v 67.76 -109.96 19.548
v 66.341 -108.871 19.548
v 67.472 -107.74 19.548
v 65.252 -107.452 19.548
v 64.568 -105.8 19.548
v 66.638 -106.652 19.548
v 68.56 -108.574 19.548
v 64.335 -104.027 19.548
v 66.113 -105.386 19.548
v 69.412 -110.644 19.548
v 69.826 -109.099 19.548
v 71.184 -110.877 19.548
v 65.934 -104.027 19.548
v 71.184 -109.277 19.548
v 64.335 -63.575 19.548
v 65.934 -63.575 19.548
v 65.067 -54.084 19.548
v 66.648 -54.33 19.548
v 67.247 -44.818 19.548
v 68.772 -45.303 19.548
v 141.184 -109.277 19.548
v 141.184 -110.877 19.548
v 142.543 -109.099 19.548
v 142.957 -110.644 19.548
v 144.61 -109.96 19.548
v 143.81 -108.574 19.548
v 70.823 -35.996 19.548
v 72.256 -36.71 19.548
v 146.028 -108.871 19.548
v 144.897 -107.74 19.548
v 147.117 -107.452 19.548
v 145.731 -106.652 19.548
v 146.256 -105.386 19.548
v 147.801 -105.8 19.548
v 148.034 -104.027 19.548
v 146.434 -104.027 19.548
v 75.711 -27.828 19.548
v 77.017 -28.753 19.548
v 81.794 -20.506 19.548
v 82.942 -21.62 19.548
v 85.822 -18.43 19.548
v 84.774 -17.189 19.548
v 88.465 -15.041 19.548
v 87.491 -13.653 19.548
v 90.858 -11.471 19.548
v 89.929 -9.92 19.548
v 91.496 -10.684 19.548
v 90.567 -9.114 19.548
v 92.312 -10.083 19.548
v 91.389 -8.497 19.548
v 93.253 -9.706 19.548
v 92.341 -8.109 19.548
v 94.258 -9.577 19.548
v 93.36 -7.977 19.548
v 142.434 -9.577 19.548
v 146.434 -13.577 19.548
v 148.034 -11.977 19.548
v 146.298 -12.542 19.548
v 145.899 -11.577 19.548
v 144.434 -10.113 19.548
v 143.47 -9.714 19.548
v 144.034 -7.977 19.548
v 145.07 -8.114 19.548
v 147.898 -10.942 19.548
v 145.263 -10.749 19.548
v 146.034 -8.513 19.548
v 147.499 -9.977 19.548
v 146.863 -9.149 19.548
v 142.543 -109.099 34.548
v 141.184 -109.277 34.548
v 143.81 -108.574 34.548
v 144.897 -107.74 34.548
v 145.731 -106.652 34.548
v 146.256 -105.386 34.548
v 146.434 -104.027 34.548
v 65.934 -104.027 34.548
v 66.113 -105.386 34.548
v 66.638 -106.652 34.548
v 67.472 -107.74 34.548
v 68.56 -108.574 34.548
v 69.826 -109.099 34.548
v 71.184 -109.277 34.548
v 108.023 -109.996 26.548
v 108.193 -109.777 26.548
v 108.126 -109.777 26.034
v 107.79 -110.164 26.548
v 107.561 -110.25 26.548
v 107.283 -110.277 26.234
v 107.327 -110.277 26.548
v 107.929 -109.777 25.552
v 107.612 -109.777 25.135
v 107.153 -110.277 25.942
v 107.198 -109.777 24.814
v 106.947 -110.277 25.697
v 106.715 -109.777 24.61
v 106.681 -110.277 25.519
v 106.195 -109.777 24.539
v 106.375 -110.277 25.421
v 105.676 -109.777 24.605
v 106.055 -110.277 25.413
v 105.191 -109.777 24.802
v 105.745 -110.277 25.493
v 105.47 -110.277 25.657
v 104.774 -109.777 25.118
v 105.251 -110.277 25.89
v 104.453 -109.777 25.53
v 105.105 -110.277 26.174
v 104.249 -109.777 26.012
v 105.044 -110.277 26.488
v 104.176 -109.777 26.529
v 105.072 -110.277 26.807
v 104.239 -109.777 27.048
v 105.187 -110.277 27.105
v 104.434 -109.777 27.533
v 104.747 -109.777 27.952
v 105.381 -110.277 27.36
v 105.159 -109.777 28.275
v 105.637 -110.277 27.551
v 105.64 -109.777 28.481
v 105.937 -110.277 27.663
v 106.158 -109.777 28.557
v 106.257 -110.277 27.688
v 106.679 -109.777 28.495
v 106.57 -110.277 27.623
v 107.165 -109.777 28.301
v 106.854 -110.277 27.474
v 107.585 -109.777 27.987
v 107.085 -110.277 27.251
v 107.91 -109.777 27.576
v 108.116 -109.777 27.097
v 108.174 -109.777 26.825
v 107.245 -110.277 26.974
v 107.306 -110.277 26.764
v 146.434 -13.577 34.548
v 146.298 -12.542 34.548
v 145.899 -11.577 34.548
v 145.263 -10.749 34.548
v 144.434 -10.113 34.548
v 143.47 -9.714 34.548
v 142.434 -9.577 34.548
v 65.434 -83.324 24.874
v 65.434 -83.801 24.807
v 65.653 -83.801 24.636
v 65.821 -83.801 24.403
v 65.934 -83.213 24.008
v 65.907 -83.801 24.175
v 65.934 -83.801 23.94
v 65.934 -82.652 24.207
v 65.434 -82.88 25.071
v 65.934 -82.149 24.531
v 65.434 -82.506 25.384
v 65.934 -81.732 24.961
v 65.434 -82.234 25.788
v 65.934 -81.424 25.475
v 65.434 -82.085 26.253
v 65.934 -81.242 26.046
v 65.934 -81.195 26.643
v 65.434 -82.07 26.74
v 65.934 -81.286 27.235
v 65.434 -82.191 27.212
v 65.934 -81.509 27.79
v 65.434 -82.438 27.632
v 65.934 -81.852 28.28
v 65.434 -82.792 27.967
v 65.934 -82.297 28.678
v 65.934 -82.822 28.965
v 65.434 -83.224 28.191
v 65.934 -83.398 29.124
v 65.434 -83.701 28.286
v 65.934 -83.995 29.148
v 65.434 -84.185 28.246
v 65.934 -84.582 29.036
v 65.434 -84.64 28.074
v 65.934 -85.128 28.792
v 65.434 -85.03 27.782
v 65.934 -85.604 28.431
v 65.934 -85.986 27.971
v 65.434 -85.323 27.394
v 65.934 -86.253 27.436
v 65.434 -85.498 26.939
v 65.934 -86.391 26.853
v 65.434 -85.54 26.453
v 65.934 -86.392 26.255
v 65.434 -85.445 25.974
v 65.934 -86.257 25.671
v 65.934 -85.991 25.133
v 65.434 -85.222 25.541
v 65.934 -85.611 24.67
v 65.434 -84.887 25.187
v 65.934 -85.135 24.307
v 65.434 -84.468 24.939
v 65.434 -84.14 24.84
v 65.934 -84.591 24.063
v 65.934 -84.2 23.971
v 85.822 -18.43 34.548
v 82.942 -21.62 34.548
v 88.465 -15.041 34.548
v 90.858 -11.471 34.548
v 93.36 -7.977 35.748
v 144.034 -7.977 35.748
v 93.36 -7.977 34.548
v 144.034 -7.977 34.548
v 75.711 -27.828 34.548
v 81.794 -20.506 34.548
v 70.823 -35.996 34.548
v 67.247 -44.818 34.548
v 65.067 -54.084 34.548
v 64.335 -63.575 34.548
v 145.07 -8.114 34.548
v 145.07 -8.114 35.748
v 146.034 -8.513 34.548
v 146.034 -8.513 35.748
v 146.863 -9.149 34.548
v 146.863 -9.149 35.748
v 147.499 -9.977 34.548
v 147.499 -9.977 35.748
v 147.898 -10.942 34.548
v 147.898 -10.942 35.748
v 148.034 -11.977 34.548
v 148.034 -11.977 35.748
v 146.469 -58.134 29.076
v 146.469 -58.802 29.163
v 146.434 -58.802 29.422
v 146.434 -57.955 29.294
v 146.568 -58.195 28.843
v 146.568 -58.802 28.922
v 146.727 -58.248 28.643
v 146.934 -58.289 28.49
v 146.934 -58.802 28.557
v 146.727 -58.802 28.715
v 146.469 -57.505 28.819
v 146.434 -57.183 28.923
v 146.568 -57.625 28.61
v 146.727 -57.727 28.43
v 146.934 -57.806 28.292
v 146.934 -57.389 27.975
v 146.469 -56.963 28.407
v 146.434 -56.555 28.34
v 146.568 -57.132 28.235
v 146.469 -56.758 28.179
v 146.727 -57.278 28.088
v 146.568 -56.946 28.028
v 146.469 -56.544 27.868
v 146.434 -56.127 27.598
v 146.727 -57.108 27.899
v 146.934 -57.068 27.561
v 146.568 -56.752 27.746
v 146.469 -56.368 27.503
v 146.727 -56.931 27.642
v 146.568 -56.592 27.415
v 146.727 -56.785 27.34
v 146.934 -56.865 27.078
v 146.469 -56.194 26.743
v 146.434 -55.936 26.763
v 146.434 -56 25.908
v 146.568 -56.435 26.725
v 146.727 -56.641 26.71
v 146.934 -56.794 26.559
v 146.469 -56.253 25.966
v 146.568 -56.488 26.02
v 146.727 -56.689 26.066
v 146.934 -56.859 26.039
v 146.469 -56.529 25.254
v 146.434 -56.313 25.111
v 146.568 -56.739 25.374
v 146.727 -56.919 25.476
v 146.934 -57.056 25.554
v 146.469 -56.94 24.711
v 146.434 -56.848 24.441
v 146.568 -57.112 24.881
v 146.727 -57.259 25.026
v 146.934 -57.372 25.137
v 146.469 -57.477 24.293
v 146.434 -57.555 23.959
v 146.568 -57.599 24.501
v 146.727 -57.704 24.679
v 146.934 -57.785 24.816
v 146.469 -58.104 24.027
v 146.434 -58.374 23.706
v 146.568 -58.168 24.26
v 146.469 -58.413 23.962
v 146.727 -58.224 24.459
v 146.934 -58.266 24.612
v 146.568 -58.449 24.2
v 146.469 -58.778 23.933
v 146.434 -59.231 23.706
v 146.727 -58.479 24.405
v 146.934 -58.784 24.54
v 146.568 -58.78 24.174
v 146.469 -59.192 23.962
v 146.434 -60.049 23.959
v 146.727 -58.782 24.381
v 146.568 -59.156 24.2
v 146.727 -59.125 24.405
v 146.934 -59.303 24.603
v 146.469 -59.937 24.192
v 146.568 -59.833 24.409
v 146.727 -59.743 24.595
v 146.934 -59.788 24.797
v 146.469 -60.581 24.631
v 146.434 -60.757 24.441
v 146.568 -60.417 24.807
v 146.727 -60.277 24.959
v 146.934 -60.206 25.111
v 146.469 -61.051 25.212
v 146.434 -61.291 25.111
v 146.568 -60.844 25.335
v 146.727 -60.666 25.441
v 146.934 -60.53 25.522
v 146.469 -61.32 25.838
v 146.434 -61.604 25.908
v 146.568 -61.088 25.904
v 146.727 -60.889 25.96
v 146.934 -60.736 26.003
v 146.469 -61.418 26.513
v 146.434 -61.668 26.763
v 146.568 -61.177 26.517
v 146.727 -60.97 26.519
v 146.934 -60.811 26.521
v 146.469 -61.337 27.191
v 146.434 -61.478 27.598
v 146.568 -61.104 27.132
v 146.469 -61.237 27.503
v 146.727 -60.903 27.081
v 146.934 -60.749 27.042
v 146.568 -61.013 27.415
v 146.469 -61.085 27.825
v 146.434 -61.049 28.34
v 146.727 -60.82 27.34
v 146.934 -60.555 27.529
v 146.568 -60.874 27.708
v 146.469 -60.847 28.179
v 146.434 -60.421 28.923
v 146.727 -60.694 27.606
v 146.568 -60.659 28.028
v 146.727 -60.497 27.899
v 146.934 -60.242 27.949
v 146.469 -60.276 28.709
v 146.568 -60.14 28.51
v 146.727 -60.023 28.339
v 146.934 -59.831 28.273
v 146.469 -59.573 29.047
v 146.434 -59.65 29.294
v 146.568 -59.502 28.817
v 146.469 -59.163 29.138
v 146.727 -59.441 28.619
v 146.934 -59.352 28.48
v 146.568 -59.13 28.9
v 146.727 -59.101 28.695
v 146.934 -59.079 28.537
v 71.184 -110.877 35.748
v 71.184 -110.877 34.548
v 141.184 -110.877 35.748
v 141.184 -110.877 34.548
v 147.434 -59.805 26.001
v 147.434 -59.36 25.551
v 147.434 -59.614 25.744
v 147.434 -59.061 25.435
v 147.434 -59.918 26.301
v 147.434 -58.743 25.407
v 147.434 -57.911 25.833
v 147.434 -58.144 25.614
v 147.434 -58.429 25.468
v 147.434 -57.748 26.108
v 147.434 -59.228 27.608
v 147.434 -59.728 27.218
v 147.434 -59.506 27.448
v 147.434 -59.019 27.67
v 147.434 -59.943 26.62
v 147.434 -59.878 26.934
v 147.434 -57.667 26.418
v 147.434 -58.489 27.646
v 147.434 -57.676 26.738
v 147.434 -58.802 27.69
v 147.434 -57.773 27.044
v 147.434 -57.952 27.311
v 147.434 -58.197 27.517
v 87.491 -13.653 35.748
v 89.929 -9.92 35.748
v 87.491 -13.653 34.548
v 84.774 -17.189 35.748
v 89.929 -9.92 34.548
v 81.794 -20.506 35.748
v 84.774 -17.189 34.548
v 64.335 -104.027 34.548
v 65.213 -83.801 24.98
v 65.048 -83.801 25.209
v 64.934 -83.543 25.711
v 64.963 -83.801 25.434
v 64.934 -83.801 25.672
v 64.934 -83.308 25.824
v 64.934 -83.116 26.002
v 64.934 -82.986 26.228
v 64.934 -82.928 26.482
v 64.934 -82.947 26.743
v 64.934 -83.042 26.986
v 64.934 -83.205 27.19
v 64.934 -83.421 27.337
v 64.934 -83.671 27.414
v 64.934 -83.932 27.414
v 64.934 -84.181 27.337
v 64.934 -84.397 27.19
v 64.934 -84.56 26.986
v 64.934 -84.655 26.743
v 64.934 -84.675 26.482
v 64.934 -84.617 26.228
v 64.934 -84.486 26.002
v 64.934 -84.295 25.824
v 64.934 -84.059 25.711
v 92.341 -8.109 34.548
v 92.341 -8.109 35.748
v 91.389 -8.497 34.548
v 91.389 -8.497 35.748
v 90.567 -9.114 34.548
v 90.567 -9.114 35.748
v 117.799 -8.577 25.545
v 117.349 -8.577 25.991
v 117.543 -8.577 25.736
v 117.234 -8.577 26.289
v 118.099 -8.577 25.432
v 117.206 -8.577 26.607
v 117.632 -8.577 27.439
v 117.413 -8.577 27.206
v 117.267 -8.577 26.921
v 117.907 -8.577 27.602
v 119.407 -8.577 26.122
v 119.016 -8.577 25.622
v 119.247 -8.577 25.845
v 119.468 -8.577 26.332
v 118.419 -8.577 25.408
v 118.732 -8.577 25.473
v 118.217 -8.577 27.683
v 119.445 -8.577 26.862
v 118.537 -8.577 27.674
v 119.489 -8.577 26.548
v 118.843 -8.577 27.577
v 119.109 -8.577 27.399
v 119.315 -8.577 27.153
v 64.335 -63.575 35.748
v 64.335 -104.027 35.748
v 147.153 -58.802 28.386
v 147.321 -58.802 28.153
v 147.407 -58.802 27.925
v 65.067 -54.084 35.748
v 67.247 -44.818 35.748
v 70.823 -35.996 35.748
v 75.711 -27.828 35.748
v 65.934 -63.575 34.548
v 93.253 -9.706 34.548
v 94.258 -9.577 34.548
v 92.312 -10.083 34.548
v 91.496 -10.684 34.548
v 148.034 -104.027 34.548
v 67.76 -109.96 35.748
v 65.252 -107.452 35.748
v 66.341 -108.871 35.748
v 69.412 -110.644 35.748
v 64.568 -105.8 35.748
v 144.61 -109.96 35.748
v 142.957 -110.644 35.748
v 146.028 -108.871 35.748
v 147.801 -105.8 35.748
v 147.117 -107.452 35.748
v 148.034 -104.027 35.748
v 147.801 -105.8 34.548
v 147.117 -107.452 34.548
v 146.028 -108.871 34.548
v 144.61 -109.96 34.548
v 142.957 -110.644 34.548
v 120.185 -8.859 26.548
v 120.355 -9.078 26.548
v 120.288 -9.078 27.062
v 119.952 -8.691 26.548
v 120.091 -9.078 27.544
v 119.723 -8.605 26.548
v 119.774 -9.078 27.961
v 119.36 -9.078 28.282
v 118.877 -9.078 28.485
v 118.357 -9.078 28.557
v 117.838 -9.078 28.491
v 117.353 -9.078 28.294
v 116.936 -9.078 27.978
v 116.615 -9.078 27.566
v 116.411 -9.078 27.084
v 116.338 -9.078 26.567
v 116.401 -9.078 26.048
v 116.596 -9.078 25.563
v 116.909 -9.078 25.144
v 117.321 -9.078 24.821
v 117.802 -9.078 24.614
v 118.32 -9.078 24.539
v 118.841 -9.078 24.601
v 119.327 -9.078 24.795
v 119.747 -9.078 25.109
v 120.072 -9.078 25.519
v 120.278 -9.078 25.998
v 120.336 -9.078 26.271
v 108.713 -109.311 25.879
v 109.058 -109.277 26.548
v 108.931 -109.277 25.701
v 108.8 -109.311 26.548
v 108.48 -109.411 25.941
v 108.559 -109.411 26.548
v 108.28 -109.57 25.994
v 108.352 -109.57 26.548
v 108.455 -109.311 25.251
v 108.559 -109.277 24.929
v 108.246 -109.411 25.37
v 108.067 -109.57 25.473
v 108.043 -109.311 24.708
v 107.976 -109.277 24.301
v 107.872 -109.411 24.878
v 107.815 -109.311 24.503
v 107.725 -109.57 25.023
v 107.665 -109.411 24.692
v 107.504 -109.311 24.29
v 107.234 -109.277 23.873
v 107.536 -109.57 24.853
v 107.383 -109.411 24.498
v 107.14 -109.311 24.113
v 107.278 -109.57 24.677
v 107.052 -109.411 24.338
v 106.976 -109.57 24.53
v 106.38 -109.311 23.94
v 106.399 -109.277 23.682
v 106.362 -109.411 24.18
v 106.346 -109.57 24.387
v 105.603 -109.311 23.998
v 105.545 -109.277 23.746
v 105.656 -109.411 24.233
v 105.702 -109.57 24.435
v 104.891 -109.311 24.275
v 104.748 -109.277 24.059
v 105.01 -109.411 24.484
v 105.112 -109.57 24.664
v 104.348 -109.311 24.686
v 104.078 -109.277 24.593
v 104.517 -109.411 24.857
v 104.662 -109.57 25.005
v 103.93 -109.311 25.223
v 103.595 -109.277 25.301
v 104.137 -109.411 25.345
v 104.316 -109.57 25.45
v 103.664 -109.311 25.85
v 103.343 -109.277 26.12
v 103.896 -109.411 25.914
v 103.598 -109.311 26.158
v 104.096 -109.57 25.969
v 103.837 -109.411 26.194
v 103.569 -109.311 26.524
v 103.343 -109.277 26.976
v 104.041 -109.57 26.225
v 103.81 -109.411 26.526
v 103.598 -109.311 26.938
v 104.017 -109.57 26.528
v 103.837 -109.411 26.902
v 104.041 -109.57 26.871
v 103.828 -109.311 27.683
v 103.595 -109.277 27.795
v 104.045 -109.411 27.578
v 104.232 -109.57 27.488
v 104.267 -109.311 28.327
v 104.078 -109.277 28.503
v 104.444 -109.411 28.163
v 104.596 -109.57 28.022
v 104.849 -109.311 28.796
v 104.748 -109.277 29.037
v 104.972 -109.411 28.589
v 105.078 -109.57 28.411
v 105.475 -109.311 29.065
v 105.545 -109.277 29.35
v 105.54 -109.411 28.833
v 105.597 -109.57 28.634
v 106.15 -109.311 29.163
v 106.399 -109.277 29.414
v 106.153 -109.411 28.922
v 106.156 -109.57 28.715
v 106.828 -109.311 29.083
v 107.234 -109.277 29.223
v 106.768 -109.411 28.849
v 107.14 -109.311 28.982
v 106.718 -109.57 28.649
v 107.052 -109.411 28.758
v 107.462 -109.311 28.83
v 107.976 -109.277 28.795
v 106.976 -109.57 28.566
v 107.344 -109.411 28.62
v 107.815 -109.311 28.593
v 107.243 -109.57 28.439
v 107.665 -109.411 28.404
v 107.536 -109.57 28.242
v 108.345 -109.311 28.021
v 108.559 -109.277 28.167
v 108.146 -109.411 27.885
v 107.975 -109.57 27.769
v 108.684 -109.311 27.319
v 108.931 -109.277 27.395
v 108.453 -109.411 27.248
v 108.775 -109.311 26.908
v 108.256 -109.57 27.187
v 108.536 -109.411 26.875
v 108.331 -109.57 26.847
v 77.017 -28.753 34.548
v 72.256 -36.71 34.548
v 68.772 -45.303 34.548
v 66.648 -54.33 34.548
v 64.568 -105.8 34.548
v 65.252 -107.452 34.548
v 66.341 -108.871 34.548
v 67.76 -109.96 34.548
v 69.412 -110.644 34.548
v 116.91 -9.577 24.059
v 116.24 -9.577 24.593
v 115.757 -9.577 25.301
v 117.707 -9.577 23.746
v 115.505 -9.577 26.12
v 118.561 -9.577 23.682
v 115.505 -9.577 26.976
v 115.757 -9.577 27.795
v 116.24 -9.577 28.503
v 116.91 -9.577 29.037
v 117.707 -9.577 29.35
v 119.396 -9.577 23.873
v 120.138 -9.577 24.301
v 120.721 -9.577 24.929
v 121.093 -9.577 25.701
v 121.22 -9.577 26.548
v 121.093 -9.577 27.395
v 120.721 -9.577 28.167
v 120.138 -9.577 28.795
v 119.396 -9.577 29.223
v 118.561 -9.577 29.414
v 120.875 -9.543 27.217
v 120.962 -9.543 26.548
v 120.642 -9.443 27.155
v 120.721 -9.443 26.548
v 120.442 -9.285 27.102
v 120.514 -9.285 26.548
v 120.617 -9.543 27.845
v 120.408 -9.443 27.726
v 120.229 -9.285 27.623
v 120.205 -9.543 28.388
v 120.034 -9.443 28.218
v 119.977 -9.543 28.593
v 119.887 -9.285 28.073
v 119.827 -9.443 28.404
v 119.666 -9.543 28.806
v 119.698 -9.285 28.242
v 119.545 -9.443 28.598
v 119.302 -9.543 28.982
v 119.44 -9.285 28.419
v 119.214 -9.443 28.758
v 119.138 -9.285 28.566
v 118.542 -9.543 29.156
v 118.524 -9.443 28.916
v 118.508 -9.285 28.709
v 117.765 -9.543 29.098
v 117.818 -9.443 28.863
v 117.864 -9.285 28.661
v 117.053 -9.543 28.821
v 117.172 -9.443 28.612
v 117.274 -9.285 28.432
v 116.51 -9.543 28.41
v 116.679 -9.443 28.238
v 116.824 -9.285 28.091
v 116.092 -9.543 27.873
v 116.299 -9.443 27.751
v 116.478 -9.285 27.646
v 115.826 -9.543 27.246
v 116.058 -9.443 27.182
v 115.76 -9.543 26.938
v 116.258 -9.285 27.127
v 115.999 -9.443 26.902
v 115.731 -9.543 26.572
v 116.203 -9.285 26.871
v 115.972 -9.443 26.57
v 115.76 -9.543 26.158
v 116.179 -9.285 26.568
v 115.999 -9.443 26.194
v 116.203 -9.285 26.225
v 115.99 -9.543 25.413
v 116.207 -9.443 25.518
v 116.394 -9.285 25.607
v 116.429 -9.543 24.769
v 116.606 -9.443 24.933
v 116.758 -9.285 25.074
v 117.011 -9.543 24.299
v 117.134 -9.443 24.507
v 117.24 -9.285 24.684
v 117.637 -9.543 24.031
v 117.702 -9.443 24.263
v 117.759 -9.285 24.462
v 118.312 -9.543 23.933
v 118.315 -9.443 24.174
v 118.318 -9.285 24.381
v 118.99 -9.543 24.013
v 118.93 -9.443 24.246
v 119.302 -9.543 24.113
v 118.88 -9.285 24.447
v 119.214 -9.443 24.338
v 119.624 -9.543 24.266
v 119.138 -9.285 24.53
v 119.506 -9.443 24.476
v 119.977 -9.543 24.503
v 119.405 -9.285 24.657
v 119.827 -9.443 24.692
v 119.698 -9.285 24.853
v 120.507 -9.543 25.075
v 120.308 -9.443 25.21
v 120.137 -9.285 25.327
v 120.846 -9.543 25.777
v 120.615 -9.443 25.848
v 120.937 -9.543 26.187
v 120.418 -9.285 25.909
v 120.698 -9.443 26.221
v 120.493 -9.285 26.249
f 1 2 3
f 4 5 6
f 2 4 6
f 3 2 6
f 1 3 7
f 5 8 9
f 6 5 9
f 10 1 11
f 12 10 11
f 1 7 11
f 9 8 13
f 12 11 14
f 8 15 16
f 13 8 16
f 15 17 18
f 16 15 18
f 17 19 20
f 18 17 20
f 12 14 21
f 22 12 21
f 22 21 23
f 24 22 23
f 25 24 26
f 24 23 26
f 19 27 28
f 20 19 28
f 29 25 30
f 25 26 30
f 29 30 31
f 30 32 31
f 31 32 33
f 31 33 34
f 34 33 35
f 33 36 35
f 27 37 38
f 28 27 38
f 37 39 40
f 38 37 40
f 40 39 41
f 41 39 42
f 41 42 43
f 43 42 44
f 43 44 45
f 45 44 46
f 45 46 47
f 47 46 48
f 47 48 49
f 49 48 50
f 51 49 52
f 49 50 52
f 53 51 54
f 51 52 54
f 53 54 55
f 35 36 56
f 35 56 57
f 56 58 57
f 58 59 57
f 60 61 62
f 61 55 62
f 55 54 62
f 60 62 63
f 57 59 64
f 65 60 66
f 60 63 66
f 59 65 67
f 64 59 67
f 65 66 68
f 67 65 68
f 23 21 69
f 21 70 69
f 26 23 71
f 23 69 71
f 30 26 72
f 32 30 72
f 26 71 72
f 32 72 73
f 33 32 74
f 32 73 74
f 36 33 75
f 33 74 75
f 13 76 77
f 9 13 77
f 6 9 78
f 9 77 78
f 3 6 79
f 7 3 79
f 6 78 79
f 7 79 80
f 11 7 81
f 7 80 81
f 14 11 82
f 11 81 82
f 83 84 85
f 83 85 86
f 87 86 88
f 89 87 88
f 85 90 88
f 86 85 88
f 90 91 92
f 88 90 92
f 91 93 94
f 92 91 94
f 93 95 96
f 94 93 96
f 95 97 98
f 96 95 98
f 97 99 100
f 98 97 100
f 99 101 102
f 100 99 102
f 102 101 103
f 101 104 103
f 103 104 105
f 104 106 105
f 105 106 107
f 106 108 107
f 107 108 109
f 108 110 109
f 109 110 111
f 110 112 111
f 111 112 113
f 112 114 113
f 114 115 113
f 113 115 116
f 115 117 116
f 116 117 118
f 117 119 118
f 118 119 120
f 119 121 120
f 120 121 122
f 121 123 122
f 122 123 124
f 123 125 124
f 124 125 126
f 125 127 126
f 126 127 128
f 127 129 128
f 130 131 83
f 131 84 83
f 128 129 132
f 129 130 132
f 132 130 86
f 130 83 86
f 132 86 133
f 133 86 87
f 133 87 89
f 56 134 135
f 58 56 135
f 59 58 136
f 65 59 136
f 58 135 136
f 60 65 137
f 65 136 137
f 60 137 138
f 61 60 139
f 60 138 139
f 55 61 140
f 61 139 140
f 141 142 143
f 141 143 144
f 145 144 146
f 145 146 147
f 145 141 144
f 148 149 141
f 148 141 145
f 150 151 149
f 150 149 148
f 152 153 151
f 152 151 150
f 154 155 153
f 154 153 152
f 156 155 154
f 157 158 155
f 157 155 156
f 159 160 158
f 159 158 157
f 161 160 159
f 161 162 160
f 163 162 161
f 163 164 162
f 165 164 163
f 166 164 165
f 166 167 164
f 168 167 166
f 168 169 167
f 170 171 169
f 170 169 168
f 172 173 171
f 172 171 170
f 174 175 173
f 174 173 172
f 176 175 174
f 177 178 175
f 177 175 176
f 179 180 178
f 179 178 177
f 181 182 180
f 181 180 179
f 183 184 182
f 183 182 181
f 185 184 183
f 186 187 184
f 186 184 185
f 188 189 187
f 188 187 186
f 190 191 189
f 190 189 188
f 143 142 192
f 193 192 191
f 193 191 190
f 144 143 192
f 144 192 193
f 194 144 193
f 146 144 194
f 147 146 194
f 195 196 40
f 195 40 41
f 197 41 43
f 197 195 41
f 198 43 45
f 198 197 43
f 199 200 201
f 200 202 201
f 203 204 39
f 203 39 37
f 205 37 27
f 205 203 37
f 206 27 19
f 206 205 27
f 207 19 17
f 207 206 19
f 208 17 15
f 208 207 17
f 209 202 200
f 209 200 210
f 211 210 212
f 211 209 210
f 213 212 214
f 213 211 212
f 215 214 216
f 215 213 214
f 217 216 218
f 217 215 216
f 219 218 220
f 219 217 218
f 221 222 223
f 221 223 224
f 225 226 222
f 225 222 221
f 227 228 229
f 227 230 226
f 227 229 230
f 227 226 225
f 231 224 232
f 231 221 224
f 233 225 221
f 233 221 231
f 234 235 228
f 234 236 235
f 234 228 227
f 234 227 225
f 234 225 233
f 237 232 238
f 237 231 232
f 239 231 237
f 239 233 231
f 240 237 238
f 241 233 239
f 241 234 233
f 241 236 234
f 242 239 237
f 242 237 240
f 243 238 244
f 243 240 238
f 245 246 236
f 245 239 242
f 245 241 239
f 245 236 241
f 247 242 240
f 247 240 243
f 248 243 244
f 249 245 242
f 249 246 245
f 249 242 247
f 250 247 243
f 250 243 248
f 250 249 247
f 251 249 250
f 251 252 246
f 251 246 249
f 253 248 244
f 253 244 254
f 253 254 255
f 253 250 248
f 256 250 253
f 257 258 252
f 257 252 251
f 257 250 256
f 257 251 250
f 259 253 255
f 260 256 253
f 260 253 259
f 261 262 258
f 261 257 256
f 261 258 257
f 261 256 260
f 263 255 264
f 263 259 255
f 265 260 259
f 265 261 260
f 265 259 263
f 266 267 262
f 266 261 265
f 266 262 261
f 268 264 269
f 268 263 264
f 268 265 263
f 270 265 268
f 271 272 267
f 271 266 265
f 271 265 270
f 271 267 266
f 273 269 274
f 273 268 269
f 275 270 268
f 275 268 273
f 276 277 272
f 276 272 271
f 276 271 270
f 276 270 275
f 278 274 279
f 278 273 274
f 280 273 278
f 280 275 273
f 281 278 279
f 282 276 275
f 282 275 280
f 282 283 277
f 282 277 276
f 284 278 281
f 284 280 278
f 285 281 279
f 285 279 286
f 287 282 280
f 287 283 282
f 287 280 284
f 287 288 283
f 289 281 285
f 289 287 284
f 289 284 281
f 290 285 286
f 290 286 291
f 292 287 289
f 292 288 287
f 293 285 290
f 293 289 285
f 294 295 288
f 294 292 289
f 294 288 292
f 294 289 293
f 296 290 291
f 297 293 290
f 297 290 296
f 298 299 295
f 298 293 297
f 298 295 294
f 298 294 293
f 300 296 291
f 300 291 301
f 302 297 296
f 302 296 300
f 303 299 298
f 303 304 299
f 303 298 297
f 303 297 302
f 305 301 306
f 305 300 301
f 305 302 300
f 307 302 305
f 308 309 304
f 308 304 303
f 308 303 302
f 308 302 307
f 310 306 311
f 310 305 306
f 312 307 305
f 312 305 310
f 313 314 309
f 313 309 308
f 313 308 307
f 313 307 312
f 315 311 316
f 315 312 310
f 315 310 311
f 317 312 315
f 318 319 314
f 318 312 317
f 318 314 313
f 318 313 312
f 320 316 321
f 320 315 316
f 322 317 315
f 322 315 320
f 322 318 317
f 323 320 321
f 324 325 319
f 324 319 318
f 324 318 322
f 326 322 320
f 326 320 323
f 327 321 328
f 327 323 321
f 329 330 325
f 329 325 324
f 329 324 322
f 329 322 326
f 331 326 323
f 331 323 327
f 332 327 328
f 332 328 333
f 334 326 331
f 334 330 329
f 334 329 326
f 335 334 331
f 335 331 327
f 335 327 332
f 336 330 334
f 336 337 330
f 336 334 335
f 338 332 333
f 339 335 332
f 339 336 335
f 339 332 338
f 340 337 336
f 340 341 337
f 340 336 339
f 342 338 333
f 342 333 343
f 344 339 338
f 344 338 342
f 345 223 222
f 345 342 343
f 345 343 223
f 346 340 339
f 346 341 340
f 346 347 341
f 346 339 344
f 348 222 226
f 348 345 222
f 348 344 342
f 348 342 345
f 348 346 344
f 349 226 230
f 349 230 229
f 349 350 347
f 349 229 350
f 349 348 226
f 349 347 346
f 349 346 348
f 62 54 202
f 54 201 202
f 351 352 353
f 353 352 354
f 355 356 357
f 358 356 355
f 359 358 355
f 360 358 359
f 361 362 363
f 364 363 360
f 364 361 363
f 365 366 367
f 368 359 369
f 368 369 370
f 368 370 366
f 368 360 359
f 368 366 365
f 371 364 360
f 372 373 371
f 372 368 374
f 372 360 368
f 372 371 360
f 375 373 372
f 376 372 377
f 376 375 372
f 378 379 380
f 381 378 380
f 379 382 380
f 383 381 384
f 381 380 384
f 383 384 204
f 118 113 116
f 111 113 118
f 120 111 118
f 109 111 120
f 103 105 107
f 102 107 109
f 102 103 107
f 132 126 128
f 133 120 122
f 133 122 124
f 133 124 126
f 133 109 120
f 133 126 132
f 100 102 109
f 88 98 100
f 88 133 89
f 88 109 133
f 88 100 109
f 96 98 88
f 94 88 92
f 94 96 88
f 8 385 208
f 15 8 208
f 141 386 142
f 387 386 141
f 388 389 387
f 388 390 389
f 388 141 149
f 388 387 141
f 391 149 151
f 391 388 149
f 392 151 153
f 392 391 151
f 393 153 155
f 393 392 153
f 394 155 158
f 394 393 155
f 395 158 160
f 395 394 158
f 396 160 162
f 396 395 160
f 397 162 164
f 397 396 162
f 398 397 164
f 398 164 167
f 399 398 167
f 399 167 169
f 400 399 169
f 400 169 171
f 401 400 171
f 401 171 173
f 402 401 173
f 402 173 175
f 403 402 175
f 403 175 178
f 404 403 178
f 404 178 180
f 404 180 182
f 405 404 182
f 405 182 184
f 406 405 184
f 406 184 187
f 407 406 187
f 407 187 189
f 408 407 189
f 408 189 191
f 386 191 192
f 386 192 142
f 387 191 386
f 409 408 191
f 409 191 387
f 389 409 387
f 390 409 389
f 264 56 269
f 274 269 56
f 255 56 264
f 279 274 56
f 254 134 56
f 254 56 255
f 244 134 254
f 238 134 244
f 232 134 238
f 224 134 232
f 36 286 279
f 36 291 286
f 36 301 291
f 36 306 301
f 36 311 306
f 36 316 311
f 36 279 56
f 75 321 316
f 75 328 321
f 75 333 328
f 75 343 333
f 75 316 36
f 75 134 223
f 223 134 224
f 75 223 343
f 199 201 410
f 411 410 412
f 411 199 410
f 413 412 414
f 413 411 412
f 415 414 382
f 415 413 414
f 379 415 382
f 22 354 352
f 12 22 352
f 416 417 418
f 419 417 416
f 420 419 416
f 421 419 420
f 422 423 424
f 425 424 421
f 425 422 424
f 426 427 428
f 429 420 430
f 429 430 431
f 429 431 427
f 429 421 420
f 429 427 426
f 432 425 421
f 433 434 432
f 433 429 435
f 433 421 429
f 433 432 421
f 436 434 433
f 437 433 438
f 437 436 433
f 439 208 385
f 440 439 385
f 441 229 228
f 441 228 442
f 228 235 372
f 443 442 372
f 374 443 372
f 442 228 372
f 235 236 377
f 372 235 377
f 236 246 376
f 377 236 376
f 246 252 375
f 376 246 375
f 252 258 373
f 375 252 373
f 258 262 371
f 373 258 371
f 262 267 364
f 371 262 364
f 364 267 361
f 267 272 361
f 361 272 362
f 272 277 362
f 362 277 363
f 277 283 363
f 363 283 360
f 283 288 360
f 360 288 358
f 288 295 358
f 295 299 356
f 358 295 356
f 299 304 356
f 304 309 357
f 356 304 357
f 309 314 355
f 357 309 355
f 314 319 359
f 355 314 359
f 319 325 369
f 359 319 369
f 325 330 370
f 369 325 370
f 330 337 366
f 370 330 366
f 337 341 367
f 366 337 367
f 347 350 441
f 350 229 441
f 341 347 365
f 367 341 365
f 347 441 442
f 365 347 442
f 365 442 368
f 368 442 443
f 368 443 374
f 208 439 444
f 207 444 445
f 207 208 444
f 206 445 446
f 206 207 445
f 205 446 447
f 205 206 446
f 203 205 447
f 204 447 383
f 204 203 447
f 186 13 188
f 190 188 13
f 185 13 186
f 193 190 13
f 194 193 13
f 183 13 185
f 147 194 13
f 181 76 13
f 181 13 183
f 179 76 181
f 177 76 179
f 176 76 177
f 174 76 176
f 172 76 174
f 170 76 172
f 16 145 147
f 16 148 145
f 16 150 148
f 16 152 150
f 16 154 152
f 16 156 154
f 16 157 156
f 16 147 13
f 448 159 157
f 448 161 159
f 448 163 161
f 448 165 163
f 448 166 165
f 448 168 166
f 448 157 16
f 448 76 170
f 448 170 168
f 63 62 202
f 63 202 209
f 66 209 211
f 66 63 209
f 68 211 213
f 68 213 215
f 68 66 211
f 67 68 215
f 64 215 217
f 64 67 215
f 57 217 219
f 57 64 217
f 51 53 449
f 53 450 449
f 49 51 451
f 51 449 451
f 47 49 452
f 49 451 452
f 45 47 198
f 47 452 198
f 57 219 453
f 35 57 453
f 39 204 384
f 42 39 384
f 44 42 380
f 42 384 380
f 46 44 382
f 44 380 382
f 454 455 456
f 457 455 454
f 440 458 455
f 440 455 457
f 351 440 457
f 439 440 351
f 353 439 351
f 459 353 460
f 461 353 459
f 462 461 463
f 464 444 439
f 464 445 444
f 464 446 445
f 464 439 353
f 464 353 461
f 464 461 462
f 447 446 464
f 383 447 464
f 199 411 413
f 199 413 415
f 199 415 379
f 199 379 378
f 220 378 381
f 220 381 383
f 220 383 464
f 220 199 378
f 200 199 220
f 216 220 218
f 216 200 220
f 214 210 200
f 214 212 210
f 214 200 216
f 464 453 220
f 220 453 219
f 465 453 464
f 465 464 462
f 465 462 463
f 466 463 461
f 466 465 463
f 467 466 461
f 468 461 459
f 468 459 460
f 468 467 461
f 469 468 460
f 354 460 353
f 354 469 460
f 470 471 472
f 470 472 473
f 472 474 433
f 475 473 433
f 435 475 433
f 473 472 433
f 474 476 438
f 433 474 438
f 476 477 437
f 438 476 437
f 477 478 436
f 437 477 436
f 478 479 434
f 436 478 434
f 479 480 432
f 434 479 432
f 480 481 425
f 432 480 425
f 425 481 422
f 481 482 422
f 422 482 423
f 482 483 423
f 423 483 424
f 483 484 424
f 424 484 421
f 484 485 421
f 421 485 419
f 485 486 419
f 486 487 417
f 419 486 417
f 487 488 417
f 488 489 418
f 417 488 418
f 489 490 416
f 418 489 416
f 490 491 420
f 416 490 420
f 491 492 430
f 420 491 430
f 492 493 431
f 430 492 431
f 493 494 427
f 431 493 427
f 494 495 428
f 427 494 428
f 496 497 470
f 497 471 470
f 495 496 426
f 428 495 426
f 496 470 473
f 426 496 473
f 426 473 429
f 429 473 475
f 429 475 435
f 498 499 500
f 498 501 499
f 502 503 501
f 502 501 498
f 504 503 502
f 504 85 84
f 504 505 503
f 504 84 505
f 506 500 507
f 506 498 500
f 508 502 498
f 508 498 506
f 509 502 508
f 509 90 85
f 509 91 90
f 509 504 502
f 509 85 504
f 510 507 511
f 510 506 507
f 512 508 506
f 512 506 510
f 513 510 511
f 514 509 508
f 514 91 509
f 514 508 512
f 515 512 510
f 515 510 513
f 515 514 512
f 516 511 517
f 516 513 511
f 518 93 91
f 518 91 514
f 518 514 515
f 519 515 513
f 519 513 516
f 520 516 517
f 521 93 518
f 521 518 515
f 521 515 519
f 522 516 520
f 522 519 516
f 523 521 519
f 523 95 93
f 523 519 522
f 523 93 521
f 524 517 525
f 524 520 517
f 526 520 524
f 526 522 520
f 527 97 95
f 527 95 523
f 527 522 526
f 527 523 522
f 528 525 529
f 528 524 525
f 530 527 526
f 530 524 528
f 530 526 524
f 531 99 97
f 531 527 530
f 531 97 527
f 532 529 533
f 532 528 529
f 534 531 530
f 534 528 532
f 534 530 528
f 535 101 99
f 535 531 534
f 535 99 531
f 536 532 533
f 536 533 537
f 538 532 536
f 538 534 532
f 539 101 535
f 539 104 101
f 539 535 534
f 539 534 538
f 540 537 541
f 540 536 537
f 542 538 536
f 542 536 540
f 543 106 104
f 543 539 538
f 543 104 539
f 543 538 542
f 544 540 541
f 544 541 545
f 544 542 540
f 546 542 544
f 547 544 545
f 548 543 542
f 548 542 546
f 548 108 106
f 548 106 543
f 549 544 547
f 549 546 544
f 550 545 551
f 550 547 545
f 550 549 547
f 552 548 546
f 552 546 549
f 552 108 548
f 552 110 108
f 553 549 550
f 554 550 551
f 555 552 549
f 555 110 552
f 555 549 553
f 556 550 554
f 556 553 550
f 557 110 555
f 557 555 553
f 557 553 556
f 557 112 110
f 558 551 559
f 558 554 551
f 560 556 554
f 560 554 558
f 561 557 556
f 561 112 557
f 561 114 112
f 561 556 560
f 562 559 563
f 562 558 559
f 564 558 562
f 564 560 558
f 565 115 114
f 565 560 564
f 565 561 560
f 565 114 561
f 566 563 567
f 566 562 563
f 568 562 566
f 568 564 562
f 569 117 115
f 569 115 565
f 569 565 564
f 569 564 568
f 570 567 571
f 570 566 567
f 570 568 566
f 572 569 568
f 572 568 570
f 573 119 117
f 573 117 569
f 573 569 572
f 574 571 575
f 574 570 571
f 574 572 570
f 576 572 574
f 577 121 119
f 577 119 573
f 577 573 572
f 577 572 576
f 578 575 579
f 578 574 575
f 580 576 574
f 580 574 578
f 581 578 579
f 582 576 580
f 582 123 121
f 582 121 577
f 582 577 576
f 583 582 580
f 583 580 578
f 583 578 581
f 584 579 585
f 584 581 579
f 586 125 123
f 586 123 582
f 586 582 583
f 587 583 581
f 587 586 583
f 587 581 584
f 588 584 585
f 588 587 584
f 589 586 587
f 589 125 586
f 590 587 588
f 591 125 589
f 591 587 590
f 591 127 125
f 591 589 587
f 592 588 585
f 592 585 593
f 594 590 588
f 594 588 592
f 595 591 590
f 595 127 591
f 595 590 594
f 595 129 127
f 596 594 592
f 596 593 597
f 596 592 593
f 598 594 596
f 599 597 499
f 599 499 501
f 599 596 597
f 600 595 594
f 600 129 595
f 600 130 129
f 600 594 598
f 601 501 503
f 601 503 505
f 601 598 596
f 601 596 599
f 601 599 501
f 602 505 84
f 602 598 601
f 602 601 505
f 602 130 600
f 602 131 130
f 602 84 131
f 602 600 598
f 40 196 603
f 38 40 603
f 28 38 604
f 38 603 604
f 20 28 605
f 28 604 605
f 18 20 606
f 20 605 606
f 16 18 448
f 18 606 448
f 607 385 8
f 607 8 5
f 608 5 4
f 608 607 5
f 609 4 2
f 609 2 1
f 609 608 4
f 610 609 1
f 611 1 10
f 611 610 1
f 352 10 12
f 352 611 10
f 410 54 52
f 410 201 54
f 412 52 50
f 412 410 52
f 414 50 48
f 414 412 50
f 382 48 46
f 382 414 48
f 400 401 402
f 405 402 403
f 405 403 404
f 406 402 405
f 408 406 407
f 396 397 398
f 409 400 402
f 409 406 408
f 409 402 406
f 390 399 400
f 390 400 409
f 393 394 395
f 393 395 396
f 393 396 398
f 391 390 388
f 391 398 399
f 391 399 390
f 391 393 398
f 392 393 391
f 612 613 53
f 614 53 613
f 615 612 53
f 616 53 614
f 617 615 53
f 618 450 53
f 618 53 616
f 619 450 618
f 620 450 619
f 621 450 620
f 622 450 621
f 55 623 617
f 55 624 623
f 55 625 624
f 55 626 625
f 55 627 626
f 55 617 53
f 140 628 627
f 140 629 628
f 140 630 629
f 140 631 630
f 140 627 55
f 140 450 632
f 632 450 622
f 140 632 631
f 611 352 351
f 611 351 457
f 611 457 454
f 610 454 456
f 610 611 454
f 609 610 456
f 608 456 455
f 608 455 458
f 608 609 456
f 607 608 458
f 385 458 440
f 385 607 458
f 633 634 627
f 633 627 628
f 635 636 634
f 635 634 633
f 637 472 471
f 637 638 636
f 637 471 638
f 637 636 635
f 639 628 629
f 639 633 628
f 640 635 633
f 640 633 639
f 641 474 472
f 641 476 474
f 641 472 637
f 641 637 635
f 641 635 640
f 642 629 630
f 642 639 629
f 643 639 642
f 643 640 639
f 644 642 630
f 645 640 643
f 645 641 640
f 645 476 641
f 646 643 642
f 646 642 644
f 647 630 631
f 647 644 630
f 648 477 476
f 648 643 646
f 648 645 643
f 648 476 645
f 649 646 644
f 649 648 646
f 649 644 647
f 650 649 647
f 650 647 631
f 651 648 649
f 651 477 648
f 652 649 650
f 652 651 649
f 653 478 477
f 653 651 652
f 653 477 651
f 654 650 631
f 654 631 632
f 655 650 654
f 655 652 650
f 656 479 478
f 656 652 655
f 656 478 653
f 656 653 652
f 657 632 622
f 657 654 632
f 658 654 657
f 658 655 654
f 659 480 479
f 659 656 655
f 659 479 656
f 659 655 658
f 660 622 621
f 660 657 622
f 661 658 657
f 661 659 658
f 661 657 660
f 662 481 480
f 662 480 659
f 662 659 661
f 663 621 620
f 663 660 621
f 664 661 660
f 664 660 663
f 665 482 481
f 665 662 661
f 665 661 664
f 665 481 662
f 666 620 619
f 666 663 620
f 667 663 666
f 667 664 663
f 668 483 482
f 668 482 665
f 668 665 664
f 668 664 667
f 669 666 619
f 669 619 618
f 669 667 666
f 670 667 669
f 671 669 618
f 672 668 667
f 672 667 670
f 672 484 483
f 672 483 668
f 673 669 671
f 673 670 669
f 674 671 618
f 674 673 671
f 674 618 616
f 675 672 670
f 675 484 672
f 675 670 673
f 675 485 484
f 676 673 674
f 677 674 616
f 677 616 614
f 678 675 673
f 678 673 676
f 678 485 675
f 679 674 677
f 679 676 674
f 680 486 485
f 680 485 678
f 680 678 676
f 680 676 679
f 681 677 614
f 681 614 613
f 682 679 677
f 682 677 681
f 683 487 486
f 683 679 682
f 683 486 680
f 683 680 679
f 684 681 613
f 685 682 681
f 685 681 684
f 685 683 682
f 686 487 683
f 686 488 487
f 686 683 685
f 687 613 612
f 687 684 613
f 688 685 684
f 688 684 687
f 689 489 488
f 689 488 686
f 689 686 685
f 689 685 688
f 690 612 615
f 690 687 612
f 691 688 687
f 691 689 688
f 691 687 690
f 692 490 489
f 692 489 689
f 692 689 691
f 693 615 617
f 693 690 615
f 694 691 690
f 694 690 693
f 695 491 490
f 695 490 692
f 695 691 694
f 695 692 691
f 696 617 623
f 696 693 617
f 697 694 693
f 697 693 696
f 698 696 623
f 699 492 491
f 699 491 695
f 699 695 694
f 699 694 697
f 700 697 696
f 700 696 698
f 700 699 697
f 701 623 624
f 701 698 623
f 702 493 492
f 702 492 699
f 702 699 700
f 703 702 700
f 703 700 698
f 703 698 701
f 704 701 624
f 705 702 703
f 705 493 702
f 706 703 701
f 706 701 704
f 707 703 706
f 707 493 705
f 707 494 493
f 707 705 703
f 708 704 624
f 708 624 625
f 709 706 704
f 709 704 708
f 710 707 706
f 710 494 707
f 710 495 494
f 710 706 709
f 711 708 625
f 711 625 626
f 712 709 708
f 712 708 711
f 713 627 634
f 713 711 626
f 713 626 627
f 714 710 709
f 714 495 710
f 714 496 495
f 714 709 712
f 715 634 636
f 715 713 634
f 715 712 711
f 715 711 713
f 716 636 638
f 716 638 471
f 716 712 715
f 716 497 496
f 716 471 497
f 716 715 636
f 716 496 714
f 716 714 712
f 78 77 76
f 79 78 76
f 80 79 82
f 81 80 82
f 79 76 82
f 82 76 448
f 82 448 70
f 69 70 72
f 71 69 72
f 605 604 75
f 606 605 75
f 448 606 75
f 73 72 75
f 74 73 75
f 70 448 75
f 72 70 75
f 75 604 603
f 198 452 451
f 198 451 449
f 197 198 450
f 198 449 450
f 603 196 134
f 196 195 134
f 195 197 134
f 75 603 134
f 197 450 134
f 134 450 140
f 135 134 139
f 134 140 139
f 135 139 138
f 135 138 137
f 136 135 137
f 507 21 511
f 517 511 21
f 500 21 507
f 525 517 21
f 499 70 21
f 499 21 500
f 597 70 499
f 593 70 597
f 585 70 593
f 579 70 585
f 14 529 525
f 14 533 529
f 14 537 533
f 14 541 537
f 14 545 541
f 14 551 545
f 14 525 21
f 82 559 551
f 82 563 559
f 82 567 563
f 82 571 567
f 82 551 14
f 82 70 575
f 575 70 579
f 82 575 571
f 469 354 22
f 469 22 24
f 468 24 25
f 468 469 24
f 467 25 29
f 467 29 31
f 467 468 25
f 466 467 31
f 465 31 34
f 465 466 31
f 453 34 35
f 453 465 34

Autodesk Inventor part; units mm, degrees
ref_plane "YZ Plane" through (0, 0, 0) normal (1, 0, 0) x (0, 1, 0)
ref_plane "XZ Plane" through (0, 0, 0) normal (0, 1, 0) x (-1, 0, 0)
ref_plane "XY Plane" through (0, 0, 0) normal (0, 0, 1) x (1, 0, 0)
ref_plane "Work Plane1" through (106.1845, -59.4274, 33.5479) normal (0, 0, 1) x (1, 0, 0)
sketch "Sketch2" plane through (106.1845, -59.4274, 33.5479) normal (0, 0, 1) x (1, 0, 0)
  arc A0 (-23.0626, 37.6331) -> (-14.0565, 49.6) centre (-66.1252, 79.4136) ccw
  line L0 (40, 49.6) -> (-14.0565, 49.6)
  arc A1 (-23.0626, 37.6331) -> (-40, -4.1474) centre (20, -4.1474) ccw construction
  line L1 (-40, -4.1474) -> (-40, -44.6)
  line L2 (-35, -49.6) -> (35, -49.6)
  arc A2 (-40, -44.6) -> (-35, -49.6) centre (-35, -44.6) ccw
  arc A3 (35, -49.6) -> (40, -44.6) centre (35, -44.6) ccw
  line L3 (40, -44.6) -> (40, 49.6)
  arc A4 (-23.242, 37.8072) -> (-40.25, -4.1474) centre (20, -4.1474) ccw
  arc A5 (-23.242, 37.8072) -> (-14.2017, 49.85) centre (-66.1252, 79.4136) ccw
  line L4 (-14.2017, 49.85) -> (40.25, 49.85)
  line L5 (40.25, 49.85) -> (40.25, -44.6)
  arc A6 (35, -49.85) -> (40.25, -44.6) centre (35, -44.6) ccw
  line L6 (35, -49.85) -> (-35, -49.85)
  arc A7 (-40.25, -44.6) -> (-35, -49.85) centre (-35, -44.6) ccw
  line L7 (-40.25, -44.6) -> (-40.25, -4.1474)
  arc A8 (-24.3904, 38.9214) -> (-41.85, -4.1474) centre (20, -4.1474) ccw
  arc A9 (-24.3904, 38.9214) -> (-15.1403, 51.45) centre (-66.1252, 79.4136) ccw
  line L8 (-15.1403, 51.45) -> (41.85, 51.45)
  line L9 (41.85, 51.45) -> (41.85, -44.6)
  arc A10 (35, -51.45) -> (41.85, -44.6) centre (35, -44.6) ccw
  line L10 (35, -51.45) -> (-35, -51.45)
  arc A11 (-41.85, -44.6) -> (-35, -51.45) centre (-35, -44.6) ccw
  line L11 (-41.85, -44.6) -> (-41.85, -4.1474)
  point P0 (-106.1845, 59.4274)
  dimension "d0" = 0.25
  dimension "d1" = 1.6
extrude "Extrusion1" add sketch "Sketch2" against normal blind 15
thicken "Thicken1" operation add thickness 1 both sides no extend neighbours yes toward (0, 0, 1) faces at (147.5012, -40.5274, 33.5479)
sketch "Sketch3" plane through (71.1845, -110.8774, 34.5479) normal (0, 0, 1) x (1, 0, 0)
  line L0 (0, 0) -> (70, 0) projected
  arc A0 (70, 0) -> (76.85, 6.85) centre (70, 6.85) ccw projected
  line L1 (76.85, 6.85) -> (76.85, 102.9) projected
  line L2 (76.85, 102.9) -> (19.8597, 102.9) projected
  arc A1 (10.6096, 90.3714) -> (19.8597, 102.9) centre (-31.1252, 130.8636) ccw projected
  arc A2 (10.6096, 90.3714) -> (-6.85, 47.3026) centre (55, 47.3026) ccw projected
  line L3 (-6.85, 47.3026) -> (-6.85, 6.85) projected
  arc A3 (-6.85, 6.85) -> (0, 0) centre (0, 6.85) ccw projected
  arc A4 (70, 1.6) -> (75.25, 6.85) centre (70, 6.85) ccw projected
  line L4 (70, 1.6) -> (0, 1.6) projected
  arc A5 (-5.25, 6.85) -> (0, 1.6) centre (0, 6.85) ccw projected
  line L5 (-5.25, 6.85) -> (-5.25, 47.3026) projected
  arc A6 (11.758, 89.2572) -> (-5.25, 47.3026) centre (55, 47.3026) ccw projected
  arc A7 (11.758, 89.2572) -> (20.7983, 101.3) centre (-31.1252, 130.8636) ccw projected
  line L6 (20.7983, 101.3) -> (75.25, 101.3) projected
  line L7 (75.25, 101.3) -> (75.25, 6.85) projected
  point P0 (-71.1845, 110.8774)
extrude "Extrusion2" add sketch "Sketch3" along normal blind 1.2 contours A3 L3 A2 A1 L2 L1 A0 L0 | L4 A5 L5 A6 A7 L6 L7 A4
fillet "Fillet1" radius 4 4 edges at (91.0442, -7.9774, 27.1479) (148.0345, -7.9774, 27.1479) (146.4345, -9.5774, 26.5479) (91.9828, -9.5774, 26.5479)
sketch "Sketch4" plane through (94.2584, -9.5774, 18.5479) normal (0, -1, 0) x (1, 0, 0)
  line L0 (0, 0) -> (0, 16) construction
  line L1 (48.1761, 0) -> (0, 0) construction
  line L2 (48.1761, 16) -> (48.1761, 0) construction
  line L3 (0, 16) -> (48.1761, 16) construction
  circle A0 centre (24.0881, 8) radius 1.875
  line L4 (0, 0) -> (0, 16) projected
  point P0 (-94.2584, -18.5479)
  point P1 (0, 8)
  point P2 (24.0881, 0)
  dimension "d11" = 3.75
extrude "Extrusion3" cut sketch "Sketch4" against normal blind 1
sketch "Sketch5" plane through (146.4345, -104.0274, 18.5479) normal (-1, 0, 0) x (0, 0, 1)
  circle A0 centre (8, 45.225) radius 1.875
  line L0 (0, 0) -> (0, 90.45) construction
  line L1 (16, 0) -> (0, 0) construction
  point P0 (-18.5479, 104.0274)
  point P1 (0, 45.225)
  point P2 (8, 0)
  dimension "d15" = 3.75
extrude "Extrusion4" cut sketch "Sketch5" against normal blind 1
sketch "Sketch6" plane through (71.1845, -109.2774, 18.5479) normal (0, 1, 0) x (1, 0, 0)
  circle A0 centre (35, -8) radius 1.875
  line L0 (70, -16) -> (70, 0) projected
  line L1 (0, 0) -> (70, 0) projected
  point P0 (-71.1845, 18.5479)
  point P1 (35, 0)
  point P2 (70, -8)
  dimension "d19" = 3.75
sketch "Sketch7" plane through (65.9345, -104.0274, 18.5479) normal (1, 0, 0) x (0, 0, -1)
  circle A0 centre (-8, 20.2263) radius 1.875
  line L0 (-16, 40.4526) -> (0, 40.4526) projected
  line L1 (0, 40.4526) -> (0, 0) projected
  point P0 (18.5479, 104.0274)
  point P1 (-8, 40.4526)
  point P2 (0, 20.2263)
  dimension "d20" = 3.75
extrude "Extrusion5" cut sketch "Sketch7" against normal blind 1
extrude "Extrusion6" cut sketch "Sketch6" against normal blind 1
fillet "Fillet4" radius 1 8 edges at (64.9345, -83.8011, 28.4229) (65.9345, -83.8011, 28.4229) (104.3095, -109.2774, 26.5479) (104.3095, -110.2774, 26.5479) (146.4345, -58.8024, 24.6729) (147.4345, -58.8024, 24.6729) (116.4715, -9.5774, 26.5479) (116.4715, -8.5774, 26.5479)
thicken "Thicken2" operation add thickness 1 both sides no extend neighbours yes toward (0, 0, 1) faces at (147.5012, -43.1941, 18.5479)
properties part number "WemosCover"
